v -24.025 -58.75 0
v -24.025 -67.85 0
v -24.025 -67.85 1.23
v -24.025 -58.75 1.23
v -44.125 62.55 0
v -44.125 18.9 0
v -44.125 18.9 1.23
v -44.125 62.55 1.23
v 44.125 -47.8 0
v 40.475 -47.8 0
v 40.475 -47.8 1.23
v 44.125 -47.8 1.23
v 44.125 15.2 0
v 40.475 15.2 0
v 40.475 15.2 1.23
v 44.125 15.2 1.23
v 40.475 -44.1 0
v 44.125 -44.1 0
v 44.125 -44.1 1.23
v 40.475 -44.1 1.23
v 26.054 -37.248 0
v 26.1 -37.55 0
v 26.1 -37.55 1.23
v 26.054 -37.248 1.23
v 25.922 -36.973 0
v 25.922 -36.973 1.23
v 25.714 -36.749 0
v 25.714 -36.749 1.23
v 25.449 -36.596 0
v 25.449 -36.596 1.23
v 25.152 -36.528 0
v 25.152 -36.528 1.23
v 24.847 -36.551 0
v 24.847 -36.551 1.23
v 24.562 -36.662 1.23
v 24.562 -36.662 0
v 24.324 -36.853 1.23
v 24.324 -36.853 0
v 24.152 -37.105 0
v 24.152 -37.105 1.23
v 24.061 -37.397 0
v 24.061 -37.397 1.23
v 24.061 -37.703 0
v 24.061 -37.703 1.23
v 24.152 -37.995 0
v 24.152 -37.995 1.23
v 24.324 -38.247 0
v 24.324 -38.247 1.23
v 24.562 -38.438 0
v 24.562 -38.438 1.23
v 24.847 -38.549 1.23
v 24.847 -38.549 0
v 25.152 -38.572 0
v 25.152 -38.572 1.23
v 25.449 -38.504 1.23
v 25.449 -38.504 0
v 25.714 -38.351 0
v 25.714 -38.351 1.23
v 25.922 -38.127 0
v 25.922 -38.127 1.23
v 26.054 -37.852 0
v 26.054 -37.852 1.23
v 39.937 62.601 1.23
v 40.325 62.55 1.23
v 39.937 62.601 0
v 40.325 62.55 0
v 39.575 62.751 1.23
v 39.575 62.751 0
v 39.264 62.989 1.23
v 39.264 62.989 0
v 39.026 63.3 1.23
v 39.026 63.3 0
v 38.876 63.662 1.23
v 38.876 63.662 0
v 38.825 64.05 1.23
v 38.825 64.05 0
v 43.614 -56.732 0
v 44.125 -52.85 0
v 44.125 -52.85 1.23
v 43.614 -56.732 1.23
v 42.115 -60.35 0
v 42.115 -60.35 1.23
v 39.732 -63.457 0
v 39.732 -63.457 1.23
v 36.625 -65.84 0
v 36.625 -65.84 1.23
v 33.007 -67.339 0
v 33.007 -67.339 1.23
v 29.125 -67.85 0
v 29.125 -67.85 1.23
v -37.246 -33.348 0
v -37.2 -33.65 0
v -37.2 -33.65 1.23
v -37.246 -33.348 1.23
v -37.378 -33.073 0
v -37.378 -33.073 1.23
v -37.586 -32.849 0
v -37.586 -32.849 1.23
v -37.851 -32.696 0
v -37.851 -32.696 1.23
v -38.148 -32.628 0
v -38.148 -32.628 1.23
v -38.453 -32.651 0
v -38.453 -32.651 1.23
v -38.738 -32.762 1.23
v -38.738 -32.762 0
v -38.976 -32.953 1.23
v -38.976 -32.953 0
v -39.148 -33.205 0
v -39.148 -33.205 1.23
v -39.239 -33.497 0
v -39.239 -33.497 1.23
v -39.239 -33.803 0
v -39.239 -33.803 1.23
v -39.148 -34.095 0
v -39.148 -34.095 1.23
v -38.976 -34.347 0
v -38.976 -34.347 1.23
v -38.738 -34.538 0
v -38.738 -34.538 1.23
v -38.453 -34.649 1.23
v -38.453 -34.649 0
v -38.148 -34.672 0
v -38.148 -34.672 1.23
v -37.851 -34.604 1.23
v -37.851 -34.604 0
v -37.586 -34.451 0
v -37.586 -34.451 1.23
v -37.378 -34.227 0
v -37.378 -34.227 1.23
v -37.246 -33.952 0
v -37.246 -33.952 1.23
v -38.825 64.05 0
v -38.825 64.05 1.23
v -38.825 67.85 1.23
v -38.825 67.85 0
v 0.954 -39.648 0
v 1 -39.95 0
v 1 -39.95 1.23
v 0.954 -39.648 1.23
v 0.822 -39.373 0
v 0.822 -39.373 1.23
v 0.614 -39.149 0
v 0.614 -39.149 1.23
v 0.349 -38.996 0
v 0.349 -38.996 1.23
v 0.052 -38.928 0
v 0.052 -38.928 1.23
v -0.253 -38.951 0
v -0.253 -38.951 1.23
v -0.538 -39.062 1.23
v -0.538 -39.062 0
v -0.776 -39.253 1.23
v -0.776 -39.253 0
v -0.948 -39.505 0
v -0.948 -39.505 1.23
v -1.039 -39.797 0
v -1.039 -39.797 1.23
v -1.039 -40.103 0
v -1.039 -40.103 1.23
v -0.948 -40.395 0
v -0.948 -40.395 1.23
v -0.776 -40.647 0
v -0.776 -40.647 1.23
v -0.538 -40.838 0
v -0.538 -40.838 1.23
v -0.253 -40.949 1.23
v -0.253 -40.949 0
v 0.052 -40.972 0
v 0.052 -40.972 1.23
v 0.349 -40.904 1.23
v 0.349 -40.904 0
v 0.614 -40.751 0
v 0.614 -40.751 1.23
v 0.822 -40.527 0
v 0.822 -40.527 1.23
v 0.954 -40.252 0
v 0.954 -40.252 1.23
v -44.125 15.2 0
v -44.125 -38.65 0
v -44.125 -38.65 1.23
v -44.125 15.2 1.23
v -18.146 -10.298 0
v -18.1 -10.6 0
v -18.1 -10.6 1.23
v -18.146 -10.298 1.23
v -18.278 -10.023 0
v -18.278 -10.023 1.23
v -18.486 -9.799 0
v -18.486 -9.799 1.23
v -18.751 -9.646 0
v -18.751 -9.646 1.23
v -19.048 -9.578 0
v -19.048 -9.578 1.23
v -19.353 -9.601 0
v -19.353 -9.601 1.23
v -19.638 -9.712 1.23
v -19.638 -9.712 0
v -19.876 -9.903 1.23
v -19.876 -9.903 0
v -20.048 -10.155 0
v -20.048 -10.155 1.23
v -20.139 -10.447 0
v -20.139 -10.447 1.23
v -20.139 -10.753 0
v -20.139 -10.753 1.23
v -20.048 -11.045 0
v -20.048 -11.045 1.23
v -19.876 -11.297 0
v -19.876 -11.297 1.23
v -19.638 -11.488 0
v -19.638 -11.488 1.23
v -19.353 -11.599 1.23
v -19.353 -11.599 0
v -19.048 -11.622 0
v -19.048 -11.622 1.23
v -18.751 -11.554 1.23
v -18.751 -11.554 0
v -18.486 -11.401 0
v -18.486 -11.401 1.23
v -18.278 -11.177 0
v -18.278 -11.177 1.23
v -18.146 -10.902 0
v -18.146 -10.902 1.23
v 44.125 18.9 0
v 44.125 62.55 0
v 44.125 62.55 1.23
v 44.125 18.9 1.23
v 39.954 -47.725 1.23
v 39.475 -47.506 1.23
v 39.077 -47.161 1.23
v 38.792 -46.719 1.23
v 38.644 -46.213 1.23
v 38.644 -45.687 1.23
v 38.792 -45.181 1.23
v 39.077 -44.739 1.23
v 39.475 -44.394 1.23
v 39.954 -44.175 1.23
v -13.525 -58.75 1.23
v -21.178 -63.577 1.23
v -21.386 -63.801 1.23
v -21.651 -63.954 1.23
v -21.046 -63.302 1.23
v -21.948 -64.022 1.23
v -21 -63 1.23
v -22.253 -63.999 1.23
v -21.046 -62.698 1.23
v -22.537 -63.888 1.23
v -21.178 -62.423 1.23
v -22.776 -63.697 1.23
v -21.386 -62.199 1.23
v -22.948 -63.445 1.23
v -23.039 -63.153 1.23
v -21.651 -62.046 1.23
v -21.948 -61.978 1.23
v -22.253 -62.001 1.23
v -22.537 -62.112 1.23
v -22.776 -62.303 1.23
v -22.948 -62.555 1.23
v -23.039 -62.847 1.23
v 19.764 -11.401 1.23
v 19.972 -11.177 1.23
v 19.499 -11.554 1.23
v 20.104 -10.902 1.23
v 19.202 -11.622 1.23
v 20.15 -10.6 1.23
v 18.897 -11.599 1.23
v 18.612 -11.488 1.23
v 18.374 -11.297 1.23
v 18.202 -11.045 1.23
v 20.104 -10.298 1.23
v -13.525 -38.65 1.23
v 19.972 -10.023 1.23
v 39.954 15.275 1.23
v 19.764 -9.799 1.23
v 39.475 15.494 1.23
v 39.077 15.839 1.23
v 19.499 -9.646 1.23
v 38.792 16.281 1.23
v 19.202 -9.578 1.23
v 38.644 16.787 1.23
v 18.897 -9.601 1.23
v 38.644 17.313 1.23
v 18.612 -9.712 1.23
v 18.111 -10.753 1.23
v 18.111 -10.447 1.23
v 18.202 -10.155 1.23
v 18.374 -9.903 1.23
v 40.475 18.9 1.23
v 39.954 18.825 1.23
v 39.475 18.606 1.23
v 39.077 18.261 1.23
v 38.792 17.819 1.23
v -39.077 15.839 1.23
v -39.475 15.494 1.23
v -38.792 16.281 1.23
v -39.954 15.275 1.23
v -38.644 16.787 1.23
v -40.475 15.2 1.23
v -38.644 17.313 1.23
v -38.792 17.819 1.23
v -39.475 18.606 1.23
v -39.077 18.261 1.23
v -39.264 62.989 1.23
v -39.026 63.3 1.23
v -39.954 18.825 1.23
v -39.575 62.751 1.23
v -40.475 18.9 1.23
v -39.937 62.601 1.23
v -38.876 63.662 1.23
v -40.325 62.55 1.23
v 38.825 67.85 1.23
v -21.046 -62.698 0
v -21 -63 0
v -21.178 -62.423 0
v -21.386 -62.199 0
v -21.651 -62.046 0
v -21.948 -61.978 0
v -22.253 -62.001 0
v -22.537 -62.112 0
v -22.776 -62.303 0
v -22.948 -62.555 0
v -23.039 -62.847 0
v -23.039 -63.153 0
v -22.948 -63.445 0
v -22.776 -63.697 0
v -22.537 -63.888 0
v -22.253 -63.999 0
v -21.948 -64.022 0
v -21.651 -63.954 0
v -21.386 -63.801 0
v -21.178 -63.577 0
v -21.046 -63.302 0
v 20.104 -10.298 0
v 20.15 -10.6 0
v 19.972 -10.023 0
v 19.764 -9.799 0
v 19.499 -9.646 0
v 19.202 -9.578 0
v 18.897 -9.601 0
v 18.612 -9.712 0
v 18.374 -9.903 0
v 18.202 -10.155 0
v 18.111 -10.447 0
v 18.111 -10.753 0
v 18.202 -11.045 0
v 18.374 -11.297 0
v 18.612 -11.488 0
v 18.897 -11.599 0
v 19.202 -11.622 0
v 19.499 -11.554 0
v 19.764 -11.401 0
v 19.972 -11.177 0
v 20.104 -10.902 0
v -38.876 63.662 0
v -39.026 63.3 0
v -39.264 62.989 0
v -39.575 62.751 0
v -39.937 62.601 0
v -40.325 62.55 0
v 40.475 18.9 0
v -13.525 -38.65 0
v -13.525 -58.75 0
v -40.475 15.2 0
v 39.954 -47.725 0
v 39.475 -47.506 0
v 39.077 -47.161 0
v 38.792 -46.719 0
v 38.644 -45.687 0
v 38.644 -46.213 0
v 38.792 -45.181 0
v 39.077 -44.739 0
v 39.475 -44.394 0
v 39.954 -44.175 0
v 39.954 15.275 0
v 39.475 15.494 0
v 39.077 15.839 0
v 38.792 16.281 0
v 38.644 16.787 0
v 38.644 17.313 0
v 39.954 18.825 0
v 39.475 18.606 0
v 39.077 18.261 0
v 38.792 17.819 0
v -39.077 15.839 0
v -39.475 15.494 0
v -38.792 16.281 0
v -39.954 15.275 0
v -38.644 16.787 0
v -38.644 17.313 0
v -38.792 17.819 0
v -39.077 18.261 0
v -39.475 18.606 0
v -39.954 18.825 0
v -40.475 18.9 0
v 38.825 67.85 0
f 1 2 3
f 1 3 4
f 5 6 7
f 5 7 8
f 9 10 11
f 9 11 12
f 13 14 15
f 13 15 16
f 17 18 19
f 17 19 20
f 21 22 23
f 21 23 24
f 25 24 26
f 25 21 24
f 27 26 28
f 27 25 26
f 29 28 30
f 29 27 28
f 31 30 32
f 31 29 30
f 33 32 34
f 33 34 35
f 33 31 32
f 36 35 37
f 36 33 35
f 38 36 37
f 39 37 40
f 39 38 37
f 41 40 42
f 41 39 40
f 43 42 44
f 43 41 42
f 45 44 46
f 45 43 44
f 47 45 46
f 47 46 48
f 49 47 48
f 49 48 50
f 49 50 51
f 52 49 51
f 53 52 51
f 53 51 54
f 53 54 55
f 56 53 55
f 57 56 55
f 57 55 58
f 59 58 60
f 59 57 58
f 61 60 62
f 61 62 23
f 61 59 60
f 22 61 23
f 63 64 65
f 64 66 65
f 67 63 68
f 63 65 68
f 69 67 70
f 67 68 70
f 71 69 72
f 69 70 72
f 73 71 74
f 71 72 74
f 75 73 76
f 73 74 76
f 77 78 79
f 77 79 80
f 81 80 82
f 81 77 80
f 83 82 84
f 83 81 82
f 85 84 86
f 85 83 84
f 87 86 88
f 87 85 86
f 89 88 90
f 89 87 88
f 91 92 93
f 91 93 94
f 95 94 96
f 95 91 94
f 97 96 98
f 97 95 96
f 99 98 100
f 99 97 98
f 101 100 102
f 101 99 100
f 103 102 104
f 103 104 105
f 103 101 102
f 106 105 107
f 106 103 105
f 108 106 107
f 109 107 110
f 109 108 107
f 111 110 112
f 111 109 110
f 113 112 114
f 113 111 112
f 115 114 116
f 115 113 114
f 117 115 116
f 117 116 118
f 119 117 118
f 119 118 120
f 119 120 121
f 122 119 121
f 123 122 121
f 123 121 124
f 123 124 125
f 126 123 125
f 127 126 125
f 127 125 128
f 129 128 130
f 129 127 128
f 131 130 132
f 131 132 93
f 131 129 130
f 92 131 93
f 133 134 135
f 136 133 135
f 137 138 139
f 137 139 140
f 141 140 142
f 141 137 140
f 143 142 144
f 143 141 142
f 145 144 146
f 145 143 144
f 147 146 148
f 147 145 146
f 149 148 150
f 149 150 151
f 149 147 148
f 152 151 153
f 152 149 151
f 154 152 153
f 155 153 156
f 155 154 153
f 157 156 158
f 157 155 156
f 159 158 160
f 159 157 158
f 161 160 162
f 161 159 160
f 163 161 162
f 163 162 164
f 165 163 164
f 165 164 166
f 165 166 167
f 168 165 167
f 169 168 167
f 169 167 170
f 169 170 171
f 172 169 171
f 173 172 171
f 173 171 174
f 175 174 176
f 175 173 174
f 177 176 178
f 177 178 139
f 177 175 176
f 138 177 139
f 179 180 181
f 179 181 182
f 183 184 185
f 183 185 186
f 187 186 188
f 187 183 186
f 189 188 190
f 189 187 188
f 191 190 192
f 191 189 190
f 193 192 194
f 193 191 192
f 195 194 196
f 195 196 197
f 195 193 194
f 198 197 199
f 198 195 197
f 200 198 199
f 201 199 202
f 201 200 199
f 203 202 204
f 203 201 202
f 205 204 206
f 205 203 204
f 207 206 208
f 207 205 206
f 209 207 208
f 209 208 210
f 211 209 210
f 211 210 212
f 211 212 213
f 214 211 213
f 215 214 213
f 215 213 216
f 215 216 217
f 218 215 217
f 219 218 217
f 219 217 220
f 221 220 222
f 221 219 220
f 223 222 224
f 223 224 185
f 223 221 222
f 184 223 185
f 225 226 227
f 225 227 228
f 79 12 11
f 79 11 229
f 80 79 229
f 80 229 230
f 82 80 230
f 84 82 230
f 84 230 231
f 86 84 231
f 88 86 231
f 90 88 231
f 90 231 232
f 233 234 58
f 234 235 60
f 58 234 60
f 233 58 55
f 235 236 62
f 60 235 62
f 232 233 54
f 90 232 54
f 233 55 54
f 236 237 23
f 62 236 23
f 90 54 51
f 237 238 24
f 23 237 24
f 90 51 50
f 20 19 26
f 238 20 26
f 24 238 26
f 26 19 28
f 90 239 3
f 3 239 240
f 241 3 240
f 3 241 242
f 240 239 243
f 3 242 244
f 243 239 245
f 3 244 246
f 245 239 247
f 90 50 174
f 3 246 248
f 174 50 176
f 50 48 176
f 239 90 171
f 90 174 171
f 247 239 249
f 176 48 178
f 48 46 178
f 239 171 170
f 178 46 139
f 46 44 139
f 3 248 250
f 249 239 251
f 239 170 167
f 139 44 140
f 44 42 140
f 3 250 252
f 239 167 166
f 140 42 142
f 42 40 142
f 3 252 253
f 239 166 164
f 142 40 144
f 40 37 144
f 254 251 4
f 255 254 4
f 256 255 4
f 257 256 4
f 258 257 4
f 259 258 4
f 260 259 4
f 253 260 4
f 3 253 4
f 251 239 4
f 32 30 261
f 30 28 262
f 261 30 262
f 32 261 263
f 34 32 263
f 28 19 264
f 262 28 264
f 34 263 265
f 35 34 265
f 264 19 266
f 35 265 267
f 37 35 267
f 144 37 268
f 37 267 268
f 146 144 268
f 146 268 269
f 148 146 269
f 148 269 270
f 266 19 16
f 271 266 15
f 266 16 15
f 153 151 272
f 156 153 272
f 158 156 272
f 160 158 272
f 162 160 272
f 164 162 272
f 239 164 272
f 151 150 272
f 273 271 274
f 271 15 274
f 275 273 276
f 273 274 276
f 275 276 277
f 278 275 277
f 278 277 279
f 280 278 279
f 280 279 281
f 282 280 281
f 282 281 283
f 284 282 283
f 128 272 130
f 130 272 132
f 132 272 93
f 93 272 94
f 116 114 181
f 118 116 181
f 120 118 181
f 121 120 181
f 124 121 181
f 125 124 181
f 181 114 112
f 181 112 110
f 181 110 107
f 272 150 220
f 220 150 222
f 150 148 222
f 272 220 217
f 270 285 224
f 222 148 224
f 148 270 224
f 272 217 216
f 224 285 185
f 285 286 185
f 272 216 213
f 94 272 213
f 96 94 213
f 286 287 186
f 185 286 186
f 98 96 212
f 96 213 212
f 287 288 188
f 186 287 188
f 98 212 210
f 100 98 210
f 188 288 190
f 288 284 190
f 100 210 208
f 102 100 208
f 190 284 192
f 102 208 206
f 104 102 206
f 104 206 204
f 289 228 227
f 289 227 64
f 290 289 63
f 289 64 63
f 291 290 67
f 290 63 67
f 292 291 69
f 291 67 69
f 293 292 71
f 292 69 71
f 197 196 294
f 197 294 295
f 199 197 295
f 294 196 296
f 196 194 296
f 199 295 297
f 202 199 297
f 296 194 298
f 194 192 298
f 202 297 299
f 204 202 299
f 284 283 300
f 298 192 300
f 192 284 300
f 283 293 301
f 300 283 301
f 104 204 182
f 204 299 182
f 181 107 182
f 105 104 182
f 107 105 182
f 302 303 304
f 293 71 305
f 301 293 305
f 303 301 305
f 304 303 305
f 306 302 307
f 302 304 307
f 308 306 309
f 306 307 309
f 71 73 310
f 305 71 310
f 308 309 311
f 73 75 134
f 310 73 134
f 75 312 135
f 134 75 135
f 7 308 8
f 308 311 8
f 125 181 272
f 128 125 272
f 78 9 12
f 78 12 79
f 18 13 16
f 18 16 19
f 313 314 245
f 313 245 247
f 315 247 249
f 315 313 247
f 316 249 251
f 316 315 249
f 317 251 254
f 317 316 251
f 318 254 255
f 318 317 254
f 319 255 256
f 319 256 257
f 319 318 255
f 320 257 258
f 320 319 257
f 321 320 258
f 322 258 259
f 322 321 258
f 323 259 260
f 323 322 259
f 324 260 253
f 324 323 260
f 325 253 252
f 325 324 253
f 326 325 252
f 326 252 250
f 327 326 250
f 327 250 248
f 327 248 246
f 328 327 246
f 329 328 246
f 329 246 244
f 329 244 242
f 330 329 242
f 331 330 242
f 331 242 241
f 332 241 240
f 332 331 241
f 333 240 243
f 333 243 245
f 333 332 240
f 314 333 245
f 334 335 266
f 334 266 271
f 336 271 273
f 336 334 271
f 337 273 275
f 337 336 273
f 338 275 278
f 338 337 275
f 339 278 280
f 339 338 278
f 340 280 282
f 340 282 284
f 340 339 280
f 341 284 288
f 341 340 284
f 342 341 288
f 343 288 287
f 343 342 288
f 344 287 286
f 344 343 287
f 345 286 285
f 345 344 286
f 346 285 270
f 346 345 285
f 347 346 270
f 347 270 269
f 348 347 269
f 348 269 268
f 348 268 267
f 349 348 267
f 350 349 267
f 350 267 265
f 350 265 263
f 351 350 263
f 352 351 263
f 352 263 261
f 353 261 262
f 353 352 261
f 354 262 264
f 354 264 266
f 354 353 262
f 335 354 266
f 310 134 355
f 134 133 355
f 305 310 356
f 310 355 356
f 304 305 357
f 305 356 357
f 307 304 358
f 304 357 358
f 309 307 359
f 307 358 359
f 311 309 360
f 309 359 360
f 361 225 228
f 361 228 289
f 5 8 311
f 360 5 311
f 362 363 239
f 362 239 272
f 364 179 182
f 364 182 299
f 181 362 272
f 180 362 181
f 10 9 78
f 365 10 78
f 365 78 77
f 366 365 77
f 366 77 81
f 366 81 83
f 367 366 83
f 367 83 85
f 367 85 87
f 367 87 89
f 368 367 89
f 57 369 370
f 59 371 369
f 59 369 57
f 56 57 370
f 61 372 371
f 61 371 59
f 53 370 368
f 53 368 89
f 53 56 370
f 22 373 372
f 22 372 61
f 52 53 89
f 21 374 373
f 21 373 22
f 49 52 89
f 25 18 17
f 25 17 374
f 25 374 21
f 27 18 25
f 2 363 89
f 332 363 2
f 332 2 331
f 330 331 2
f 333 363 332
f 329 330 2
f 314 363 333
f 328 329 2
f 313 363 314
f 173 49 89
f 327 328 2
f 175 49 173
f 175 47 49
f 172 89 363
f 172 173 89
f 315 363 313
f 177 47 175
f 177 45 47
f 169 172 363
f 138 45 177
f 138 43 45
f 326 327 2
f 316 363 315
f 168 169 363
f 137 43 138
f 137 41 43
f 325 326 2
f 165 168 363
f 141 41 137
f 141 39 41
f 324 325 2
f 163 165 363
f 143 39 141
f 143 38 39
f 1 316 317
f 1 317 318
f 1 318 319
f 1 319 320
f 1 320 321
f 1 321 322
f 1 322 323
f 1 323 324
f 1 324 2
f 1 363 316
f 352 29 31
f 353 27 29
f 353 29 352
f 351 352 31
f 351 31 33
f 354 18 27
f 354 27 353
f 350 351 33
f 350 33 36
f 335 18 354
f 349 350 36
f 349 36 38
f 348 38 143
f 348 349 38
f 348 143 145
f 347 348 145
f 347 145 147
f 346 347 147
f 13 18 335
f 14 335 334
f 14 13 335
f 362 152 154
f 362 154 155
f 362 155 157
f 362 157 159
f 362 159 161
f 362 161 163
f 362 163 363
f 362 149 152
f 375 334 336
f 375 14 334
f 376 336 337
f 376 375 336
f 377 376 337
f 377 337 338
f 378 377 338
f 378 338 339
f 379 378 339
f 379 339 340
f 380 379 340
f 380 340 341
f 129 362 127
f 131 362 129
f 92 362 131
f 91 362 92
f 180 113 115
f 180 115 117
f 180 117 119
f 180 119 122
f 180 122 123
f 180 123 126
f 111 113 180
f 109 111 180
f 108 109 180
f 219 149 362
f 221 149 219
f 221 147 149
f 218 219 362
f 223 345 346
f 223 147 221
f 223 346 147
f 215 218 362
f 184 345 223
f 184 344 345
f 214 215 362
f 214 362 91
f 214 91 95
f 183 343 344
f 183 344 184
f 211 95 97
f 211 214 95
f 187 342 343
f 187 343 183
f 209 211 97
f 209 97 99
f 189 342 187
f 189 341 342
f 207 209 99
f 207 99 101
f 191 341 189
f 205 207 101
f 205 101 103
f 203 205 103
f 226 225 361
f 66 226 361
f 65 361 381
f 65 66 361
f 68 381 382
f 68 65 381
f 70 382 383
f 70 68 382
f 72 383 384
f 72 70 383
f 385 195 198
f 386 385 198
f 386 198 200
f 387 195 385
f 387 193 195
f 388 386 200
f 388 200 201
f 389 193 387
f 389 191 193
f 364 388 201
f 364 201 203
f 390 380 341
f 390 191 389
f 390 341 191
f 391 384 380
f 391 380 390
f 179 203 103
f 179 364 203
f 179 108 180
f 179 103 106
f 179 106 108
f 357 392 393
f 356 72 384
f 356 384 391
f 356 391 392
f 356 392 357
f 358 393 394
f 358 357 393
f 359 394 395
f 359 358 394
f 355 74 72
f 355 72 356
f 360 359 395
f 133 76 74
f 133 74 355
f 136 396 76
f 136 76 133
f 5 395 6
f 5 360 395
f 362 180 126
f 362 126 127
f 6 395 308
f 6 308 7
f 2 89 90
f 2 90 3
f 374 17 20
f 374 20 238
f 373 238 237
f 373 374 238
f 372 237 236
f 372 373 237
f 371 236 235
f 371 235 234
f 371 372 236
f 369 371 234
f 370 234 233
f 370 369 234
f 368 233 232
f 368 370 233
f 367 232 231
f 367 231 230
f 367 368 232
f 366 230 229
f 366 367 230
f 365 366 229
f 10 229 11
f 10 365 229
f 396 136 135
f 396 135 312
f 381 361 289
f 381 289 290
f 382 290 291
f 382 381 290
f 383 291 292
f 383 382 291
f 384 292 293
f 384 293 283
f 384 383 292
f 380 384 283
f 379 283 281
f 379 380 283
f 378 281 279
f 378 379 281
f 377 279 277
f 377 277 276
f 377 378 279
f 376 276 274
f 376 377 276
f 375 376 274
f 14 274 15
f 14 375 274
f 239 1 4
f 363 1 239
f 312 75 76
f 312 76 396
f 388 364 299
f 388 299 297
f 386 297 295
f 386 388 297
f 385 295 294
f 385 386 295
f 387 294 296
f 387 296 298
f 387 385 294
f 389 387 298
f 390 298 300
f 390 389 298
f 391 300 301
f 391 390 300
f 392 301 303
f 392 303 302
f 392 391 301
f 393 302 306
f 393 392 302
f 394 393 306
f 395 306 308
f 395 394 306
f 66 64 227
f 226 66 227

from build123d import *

# Parameters (mm, degrees)
SKETCH_1_R          = 1.025
EXTRUDE_1_DEPTH     = 1.23
SKETCH_2_W          = 5.3
SKETCH_2_H          = 5.3
CUT_EXTRUDE_1_DEPTH = 10
FILLET_1_R          = 1.5


with BuildPart() as part:
    # 草图1 → 凸台-拉伸1 (new body)
    with BuildSketch(Plane.XY):
        with BuildLine():
            Line((44.125, 15.2), (44.125, -44.1))
            Line((44.125, -44.1), (40.475, -44.1))
            ThreePointArc((40.475, -44.1), (38.625, -45.95), (40.475, -47.8))
            Line((40.475, -47.8), (44.125, -47.8))
            Line((44.125, -47.8), (44.125, -52.85))
            ThreePointArc((44.125, -52.85), (39.731601718, -63.456601718), (29.125, -67.85))
            Line((29.125, -67.85), (-24.025, -67.85))
            Line((-24.025, -67.85), (-24.025, -58.75))
            Line((-24.025, -58.75), (-13.525, -58.75))
            Line((-13.525, -58.75), (-13.525, -38.65))
            Line((-13.525, -38.65), (-44.125, -38.65))
            Line((-44.125, -38.65), (-44.125, 15.2))
            Line((-44.125, 15.2), (-40.475, 15.2))
            ThreePointArc((-40.475, 15.2), (-38.625, 17.05), (-40.475, 18.9))
            Line((-40.475, 18.9), (-44.125, 18.9))
            Line((-44.125, 18.9), (-44.125, 67.85))
            Line((-44.125, 67.85), (44.125, 67.85))
            Line((44.125, 67.85), (44.125, 18.9))
            Line((44.125, 18.9), (40.475, 18.9))
            ThreePointArc((40.475, 18.9), (38.625, 17.05), (40.475, 15.2))
            Line((40.475, 15.2), (44.125, 15.2))
        make_face()
        with Locations((-22.025, -63)):
            Circle(SKETCH_1_R, mode=Mode.SUBTRACT)
        with Locations((-19.125, -10.6)):
            Circle(SKETCH_1_R, mode=Mode.SUBTRACT)
        with Locations((-0.025, -39.95)):
            Circle(SKETCH_1_R, mode=Mode.SUBTRACT)
        with Locations((-38.225, -33.65)):
            Circle(SKETCH_1_R, mode=Mode.SUBTRACT)
        with Locations((25.075, -37.55)):
            Circle(SKETCH_1_R, mode=Mode.SUBTRACT)
        with Locations((19.125, -10.6)):
            Circle(SKETCH_1_R, mode=Mode.SUBTRACT)
    extrude(amount=EXTRUDE_1_DEPTH)

    # 草图2 → 切除-拉伸1 (cut)
    with BuildSketch(Plane.XY.offset(1.23)):
        with Locations((-41.475, 65.2)):
            Rectangle(SKETCH_2_W, SKETCH_2_H)
        with Locations((41.475, 65.2)):
            Rectangle(SKETCH_2_W, SKETCH_2_H)
    extrude(amount=-CUT_EXTRUDE_1_DEPTH, mode=Mode.SUBTRACT)

    # 圆角1
    fillet_1_edges = [part.edges().sort_by_distance(p)[0] for p in [
        (-38.825, 62.55, 0.615),
        (38.825, 62.55, 0.615),
    ]]
    fillet(fillet_1_edges, radius=FILLET_1_R)


solid = part.part
